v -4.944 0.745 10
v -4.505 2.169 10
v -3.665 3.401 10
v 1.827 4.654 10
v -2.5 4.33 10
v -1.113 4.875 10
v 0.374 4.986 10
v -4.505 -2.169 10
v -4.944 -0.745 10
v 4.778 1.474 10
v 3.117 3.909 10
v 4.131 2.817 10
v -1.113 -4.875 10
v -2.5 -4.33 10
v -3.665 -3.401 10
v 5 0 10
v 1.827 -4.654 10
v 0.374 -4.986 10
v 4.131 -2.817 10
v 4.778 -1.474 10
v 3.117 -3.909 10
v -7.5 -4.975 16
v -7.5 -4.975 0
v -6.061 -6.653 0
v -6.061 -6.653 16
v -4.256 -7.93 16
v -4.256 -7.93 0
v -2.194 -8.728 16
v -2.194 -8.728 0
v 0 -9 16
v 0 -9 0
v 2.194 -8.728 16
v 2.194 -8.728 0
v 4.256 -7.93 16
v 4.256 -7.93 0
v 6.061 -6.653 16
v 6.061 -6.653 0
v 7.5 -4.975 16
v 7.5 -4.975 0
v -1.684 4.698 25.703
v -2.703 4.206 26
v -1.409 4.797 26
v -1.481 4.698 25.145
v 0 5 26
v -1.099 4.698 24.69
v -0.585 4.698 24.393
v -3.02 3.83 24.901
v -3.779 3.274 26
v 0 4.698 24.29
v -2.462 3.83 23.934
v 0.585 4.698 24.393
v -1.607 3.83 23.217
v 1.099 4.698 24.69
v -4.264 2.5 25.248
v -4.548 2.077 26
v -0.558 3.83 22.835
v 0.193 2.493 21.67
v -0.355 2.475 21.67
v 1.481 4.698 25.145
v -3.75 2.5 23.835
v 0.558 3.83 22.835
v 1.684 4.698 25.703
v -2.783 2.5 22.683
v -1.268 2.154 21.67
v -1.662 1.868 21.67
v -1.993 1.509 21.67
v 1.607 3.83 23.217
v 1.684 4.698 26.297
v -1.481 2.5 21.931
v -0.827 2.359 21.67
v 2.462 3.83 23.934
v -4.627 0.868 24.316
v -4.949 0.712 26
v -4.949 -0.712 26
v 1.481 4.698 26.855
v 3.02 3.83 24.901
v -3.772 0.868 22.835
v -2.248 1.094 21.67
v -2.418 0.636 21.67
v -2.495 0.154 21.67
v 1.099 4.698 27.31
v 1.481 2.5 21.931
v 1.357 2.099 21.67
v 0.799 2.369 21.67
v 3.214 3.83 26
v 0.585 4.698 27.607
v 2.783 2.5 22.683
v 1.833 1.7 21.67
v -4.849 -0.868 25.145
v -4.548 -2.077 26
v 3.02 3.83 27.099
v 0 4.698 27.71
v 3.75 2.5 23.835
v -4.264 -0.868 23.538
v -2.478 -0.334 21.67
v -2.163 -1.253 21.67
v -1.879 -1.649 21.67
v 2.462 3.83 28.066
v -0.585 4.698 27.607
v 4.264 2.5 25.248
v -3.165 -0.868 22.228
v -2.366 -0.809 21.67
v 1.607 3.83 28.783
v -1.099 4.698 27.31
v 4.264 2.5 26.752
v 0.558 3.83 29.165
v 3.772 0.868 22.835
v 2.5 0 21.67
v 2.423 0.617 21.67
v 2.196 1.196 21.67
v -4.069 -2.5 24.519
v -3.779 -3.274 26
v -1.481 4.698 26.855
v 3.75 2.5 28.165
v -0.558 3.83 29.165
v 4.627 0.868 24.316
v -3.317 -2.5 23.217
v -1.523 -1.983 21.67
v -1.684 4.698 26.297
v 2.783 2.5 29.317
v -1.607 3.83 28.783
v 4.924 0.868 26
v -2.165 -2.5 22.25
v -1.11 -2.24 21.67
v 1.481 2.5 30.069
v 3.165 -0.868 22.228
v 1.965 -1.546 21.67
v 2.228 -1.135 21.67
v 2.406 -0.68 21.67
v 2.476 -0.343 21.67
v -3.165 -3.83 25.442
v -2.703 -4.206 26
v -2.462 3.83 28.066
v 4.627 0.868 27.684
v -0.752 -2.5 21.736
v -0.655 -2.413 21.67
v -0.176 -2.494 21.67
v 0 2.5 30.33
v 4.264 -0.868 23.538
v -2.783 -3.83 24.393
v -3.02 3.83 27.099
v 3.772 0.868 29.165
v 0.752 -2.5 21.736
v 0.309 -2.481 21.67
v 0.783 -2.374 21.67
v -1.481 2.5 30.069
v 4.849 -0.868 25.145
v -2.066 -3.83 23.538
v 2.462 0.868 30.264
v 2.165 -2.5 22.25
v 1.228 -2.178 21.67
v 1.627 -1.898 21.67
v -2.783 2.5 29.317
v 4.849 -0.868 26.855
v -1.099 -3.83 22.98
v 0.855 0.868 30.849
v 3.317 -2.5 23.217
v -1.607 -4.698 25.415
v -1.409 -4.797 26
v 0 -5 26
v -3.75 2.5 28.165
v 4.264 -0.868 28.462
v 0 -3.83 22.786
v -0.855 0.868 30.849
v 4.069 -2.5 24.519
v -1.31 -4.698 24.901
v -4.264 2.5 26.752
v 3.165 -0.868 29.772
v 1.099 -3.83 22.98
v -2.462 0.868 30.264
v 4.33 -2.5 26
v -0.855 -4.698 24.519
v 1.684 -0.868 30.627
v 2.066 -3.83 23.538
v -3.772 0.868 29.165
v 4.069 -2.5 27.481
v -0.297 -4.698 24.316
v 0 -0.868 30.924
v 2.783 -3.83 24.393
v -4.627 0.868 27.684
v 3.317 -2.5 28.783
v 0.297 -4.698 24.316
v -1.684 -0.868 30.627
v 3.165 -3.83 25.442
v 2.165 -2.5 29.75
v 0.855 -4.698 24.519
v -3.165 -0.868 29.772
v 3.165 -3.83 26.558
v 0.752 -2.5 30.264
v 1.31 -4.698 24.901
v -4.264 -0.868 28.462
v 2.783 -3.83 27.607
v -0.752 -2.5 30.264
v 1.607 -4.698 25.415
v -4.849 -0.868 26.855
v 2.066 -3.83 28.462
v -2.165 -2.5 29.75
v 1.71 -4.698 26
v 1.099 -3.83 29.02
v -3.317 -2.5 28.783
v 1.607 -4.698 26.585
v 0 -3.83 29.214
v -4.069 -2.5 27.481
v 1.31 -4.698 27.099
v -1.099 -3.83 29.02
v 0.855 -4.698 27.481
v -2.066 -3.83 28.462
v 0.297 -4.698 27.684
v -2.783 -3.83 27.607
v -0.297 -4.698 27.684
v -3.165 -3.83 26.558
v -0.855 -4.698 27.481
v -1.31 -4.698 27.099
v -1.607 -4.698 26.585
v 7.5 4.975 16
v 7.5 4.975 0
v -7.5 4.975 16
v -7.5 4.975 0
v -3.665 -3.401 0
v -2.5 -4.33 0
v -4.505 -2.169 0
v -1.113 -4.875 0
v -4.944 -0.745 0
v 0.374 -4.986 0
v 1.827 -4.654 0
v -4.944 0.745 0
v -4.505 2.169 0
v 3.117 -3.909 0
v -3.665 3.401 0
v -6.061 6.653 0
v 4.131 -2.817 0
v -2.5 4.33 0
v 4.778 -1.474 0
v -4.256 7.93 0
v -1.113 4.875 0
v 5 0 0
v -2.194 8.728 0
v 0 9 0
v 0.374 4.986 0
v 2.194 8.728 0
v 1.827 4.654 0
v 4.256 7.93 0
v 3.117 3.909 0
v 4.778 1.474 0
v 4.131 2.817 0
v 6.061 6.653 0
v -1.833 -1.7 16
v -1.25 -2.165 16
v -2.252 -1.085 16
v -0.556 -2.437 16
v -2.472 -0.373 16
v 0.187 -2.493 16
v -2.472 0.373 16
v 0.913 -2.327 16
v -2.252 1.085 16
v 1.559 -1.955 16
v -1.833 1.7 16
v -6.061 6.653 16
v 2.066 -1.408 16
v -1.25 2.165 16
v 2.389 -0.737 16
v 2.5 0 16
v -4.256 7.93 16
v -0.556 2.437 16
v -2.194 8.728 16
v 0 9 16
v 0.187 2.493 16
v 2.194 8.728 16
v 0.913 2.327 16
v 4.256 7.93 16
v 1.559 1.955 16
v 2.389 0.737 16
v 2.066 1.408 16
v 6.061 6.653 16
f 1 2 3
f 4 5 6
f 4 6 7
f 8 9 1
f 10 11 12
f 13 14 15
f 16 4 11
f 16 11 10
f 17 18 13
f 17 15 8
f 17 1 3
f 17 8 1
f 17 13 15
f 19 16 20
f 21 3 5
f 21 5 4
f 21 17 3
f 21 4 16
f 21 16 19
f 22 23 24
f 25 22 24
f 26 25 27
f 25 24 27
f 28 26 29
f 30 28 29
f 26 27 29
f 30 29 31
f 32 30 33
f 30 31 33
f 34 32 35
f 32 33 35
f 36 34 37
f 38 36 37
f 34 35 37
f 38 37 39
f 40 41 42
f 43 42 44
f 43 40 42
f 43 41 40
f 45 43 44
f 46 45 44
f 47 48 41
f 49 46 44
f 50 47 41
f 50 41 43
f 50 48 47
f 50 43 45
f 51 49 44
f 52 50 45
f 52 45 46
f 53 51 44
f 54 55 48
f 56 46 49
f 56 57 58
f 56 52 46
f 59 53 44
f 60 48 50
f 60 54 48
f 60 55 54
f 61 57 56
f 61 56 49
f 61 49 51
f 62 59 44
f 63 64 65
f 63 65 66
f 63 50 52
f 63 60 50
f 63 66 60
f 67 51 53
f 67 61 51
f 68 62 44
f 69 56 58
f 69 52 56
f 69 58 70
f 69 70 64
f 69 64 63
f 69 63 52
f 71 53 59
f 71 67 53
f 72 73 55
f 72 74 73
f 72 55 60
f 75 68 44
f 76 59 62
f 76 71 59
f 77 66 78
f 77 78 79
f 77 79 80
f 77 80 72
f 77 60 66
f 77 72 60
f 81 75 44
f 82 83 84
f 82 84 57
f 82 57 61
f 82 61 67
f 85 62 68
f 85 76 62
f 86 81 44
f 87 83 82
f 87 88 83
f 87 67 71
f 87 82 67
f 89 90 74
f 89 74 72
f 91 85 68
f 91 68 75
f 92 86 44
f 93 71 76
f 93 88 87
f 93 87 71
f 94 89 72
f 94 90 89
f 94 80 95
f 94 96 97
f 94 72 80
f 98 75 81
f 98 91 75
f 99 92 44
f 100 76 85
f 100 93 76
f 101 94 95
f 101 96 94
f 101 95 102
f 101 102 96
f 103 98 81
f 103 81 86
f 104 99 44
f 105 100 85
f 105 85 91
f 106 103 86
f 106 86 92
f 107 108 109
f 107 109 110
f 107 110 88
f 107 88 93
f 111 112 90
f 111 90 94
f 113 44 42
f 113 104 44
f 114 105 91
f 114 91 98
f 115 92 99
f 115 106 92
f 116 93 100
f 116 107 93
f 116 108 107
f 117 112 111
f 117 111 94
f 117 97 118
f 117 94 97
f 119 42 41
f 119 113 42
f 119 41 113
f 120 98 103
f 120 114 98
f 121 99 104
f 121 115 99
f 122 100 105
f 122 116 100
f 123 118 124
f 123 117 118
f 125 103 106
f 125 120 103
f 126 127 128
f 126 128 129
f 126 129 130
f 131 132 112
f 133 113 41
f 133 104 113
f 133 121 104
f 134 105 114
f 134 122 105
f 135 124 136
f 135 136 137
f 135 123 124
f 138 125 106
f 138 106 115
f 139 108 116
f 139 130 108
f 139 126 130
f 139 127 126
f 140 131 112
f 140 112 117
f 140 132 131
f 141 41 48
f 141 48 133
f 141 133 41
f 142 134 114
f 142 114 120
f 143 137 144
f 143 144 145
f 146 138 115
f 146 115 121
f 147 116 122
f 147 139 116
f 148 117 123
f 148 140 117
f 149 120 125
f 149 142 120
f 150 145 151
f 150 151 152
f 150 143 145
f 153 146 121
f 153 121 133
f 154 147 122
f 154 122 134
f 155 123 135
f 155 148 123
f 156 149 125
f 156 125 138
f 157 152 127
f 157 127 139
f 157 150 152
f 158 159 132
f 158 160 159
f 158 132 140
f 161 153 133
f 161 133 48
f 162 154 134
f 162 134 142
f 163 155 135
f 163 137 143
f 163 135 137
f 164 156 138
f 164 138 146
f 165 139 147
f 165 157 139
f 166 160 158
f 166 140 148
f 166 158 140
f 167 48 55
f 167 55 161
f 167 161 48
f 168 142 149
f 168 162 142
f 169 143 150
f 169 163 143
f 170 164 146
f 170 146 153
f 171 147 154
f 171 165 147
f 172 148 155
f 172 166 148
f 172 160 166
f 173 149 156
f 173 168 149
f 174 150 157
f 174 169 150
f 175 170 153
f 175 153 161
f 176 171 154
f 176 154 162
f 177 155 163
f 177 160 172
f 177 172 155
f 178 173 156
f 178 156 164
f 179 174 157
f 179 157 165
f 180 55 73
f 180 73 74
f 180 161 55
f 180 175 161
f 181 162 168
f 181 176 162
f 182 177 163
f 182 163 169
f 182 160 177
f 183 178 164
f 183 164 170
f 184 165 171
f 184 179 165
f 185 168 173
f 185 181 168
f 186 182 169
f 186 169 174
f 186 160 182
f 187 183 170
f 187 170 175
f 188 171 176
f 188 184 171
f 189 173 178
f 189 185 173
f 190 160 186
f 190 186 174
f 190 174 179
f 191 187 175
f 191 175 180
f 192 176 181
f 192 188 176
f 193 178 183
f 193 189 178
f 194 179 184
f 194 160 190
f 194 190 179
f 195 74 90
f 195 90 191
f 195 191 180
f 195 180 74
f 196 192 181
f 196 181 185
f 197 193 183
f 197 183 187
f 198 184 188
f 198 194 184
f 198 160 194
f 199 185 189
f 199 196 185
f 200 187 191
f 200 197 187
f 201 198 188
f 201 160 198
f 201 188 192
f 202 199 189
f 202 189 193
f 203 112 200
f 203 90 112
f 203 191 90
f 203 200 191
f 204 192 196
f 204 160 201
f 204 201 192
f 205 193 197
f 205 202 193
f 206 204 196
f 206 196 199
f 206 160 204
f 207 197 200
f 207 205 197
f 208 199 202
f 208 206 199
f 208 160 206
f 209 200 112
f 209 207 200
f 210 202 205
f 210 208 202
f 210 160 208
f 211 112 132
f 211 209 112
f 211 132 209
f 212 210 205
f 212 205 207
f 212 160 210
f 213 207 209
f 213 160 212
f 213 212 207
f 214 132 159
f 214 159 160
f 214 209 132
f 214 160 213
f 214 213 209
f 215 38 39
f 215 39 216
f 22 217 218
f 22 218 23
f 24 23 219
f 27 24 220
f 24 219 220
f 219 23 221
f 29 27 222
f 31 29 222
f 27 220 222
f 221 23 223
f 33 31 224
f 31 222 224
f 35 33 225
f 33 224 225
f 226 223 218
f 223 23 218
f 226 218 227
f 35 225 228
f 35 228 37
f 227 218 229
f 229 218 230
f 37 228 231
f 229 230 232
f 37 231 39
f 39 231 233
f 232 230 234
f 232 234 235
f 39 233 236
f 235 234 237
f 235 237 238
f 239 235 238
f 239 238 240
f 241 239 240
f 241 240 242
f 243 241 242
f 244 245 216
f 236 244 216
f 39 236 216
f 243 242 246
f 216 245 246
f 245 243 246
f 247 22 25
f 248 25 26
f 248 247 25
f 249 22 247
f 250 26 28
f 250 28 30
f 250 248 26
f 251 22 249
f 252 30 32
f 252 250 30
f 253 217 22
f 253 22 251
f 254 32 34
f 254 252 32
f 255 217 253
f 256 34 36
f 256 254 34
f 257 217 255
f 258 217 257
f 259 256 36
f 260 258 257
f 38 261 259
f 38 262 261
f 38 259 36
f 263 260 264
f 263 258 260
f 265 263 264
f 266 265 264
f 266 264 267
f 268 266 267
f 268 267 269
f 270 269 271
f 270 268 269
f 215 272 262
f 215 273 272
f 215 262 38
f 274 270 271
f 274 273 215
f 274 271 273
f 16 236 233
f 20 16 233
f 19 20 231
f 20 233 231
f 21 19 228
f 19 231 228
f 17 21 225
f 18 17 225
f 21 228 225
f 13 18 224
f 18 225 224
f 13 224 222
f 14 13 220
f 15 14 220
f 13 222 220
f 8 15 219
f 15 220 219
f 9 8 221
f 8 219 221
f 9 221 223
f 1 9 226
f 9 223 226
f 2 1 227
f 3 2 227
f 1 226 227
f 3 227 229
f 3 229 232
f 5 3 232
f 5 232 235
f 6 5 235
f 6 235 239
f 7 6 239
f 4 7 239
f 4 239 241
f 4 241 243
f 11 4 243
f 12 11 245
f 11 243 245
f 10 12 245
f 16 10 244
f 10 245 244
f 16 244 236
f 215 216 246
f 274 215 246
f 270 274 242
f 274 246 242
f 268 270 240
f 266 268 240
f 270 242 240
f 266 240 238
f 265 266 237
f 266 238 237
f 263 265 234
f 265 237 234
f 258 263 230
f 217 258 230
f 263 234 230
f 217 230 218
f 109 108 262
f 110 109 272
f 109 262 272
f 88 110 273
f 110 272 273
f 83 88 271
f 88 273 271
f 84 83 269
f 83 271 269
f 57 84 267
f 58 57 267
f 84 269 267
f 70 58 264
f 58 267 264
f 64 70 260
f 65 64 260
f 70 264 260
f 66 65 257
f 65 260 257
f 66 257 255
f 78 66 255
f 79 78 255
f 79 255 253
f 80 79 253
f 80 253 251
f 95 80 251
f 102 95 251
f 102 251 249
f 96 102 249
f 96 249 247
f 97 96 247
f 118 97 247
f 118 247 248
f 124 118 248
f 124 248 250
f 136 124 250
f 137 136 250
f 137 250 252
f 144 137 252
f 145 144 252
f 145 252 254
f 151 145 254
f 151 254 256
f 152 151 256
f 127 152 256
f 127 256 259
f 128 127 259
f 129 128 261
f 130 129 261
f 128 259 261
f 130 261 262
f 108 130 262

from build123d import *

# Parameters (mm, degrees)
F1_DEPTH = 16
F5_R     = 2.5
F6_DEPTH = 10
F7_R     = 5
F8_DEPTH = 10


with BuildPart() as f1:
    # F0 (on Top) → F1 (new body)
    with BuildSketch(Plane.XY):
        with BuildLine():
            Line((-7.5, 4.974937), (-7.5, -4.974937))
            ThreePointArc((-7.5, -4.974937), (0, -9), (7.5, -4.974937))
            Line((7.5, -4.974937), (7.5, 4.974937))
            ThreePointArc((7.5, 4.974937), (0, 9), (-7.5, 4.974937))
        make_face()
    extrude(amount=F1_DEPTH)



with BuildPart() as f4:
    # F3 (on offset) → F4 (revolve)
    with BuildSketch(Plane.XY.offset(26)):
        with BuildLine():
            Line((0, -5), (0, 5))
            ThreePointArc((0, 5), (-5, 0), (0, -5))
        make_face()
    revolve(axis=Axis((0, 0, 26), (0, -1, 0)))


with BuildPart() as f1_1:
    add(f1.part)

    add(f4.part)  # F6 merges F4
    # F5 (on face) → F6 (join)
    with BuildSketch(Plane.XY.offset(16)):
        Circle(F5_R)
    extrude(amount=F6_DEPTH)

    # F7 (on face) → F8 (cut)
    with BuildSketch(Plane(origin=(0, 0, 0), x_dir=(1, 0, 0), z_dir=(0, 0, -1))):
        Circle(F7_R)
    extrude(amount=-F8_DEPTH, mode=Mode.SUBTRACT)


solid = f1_1.part
